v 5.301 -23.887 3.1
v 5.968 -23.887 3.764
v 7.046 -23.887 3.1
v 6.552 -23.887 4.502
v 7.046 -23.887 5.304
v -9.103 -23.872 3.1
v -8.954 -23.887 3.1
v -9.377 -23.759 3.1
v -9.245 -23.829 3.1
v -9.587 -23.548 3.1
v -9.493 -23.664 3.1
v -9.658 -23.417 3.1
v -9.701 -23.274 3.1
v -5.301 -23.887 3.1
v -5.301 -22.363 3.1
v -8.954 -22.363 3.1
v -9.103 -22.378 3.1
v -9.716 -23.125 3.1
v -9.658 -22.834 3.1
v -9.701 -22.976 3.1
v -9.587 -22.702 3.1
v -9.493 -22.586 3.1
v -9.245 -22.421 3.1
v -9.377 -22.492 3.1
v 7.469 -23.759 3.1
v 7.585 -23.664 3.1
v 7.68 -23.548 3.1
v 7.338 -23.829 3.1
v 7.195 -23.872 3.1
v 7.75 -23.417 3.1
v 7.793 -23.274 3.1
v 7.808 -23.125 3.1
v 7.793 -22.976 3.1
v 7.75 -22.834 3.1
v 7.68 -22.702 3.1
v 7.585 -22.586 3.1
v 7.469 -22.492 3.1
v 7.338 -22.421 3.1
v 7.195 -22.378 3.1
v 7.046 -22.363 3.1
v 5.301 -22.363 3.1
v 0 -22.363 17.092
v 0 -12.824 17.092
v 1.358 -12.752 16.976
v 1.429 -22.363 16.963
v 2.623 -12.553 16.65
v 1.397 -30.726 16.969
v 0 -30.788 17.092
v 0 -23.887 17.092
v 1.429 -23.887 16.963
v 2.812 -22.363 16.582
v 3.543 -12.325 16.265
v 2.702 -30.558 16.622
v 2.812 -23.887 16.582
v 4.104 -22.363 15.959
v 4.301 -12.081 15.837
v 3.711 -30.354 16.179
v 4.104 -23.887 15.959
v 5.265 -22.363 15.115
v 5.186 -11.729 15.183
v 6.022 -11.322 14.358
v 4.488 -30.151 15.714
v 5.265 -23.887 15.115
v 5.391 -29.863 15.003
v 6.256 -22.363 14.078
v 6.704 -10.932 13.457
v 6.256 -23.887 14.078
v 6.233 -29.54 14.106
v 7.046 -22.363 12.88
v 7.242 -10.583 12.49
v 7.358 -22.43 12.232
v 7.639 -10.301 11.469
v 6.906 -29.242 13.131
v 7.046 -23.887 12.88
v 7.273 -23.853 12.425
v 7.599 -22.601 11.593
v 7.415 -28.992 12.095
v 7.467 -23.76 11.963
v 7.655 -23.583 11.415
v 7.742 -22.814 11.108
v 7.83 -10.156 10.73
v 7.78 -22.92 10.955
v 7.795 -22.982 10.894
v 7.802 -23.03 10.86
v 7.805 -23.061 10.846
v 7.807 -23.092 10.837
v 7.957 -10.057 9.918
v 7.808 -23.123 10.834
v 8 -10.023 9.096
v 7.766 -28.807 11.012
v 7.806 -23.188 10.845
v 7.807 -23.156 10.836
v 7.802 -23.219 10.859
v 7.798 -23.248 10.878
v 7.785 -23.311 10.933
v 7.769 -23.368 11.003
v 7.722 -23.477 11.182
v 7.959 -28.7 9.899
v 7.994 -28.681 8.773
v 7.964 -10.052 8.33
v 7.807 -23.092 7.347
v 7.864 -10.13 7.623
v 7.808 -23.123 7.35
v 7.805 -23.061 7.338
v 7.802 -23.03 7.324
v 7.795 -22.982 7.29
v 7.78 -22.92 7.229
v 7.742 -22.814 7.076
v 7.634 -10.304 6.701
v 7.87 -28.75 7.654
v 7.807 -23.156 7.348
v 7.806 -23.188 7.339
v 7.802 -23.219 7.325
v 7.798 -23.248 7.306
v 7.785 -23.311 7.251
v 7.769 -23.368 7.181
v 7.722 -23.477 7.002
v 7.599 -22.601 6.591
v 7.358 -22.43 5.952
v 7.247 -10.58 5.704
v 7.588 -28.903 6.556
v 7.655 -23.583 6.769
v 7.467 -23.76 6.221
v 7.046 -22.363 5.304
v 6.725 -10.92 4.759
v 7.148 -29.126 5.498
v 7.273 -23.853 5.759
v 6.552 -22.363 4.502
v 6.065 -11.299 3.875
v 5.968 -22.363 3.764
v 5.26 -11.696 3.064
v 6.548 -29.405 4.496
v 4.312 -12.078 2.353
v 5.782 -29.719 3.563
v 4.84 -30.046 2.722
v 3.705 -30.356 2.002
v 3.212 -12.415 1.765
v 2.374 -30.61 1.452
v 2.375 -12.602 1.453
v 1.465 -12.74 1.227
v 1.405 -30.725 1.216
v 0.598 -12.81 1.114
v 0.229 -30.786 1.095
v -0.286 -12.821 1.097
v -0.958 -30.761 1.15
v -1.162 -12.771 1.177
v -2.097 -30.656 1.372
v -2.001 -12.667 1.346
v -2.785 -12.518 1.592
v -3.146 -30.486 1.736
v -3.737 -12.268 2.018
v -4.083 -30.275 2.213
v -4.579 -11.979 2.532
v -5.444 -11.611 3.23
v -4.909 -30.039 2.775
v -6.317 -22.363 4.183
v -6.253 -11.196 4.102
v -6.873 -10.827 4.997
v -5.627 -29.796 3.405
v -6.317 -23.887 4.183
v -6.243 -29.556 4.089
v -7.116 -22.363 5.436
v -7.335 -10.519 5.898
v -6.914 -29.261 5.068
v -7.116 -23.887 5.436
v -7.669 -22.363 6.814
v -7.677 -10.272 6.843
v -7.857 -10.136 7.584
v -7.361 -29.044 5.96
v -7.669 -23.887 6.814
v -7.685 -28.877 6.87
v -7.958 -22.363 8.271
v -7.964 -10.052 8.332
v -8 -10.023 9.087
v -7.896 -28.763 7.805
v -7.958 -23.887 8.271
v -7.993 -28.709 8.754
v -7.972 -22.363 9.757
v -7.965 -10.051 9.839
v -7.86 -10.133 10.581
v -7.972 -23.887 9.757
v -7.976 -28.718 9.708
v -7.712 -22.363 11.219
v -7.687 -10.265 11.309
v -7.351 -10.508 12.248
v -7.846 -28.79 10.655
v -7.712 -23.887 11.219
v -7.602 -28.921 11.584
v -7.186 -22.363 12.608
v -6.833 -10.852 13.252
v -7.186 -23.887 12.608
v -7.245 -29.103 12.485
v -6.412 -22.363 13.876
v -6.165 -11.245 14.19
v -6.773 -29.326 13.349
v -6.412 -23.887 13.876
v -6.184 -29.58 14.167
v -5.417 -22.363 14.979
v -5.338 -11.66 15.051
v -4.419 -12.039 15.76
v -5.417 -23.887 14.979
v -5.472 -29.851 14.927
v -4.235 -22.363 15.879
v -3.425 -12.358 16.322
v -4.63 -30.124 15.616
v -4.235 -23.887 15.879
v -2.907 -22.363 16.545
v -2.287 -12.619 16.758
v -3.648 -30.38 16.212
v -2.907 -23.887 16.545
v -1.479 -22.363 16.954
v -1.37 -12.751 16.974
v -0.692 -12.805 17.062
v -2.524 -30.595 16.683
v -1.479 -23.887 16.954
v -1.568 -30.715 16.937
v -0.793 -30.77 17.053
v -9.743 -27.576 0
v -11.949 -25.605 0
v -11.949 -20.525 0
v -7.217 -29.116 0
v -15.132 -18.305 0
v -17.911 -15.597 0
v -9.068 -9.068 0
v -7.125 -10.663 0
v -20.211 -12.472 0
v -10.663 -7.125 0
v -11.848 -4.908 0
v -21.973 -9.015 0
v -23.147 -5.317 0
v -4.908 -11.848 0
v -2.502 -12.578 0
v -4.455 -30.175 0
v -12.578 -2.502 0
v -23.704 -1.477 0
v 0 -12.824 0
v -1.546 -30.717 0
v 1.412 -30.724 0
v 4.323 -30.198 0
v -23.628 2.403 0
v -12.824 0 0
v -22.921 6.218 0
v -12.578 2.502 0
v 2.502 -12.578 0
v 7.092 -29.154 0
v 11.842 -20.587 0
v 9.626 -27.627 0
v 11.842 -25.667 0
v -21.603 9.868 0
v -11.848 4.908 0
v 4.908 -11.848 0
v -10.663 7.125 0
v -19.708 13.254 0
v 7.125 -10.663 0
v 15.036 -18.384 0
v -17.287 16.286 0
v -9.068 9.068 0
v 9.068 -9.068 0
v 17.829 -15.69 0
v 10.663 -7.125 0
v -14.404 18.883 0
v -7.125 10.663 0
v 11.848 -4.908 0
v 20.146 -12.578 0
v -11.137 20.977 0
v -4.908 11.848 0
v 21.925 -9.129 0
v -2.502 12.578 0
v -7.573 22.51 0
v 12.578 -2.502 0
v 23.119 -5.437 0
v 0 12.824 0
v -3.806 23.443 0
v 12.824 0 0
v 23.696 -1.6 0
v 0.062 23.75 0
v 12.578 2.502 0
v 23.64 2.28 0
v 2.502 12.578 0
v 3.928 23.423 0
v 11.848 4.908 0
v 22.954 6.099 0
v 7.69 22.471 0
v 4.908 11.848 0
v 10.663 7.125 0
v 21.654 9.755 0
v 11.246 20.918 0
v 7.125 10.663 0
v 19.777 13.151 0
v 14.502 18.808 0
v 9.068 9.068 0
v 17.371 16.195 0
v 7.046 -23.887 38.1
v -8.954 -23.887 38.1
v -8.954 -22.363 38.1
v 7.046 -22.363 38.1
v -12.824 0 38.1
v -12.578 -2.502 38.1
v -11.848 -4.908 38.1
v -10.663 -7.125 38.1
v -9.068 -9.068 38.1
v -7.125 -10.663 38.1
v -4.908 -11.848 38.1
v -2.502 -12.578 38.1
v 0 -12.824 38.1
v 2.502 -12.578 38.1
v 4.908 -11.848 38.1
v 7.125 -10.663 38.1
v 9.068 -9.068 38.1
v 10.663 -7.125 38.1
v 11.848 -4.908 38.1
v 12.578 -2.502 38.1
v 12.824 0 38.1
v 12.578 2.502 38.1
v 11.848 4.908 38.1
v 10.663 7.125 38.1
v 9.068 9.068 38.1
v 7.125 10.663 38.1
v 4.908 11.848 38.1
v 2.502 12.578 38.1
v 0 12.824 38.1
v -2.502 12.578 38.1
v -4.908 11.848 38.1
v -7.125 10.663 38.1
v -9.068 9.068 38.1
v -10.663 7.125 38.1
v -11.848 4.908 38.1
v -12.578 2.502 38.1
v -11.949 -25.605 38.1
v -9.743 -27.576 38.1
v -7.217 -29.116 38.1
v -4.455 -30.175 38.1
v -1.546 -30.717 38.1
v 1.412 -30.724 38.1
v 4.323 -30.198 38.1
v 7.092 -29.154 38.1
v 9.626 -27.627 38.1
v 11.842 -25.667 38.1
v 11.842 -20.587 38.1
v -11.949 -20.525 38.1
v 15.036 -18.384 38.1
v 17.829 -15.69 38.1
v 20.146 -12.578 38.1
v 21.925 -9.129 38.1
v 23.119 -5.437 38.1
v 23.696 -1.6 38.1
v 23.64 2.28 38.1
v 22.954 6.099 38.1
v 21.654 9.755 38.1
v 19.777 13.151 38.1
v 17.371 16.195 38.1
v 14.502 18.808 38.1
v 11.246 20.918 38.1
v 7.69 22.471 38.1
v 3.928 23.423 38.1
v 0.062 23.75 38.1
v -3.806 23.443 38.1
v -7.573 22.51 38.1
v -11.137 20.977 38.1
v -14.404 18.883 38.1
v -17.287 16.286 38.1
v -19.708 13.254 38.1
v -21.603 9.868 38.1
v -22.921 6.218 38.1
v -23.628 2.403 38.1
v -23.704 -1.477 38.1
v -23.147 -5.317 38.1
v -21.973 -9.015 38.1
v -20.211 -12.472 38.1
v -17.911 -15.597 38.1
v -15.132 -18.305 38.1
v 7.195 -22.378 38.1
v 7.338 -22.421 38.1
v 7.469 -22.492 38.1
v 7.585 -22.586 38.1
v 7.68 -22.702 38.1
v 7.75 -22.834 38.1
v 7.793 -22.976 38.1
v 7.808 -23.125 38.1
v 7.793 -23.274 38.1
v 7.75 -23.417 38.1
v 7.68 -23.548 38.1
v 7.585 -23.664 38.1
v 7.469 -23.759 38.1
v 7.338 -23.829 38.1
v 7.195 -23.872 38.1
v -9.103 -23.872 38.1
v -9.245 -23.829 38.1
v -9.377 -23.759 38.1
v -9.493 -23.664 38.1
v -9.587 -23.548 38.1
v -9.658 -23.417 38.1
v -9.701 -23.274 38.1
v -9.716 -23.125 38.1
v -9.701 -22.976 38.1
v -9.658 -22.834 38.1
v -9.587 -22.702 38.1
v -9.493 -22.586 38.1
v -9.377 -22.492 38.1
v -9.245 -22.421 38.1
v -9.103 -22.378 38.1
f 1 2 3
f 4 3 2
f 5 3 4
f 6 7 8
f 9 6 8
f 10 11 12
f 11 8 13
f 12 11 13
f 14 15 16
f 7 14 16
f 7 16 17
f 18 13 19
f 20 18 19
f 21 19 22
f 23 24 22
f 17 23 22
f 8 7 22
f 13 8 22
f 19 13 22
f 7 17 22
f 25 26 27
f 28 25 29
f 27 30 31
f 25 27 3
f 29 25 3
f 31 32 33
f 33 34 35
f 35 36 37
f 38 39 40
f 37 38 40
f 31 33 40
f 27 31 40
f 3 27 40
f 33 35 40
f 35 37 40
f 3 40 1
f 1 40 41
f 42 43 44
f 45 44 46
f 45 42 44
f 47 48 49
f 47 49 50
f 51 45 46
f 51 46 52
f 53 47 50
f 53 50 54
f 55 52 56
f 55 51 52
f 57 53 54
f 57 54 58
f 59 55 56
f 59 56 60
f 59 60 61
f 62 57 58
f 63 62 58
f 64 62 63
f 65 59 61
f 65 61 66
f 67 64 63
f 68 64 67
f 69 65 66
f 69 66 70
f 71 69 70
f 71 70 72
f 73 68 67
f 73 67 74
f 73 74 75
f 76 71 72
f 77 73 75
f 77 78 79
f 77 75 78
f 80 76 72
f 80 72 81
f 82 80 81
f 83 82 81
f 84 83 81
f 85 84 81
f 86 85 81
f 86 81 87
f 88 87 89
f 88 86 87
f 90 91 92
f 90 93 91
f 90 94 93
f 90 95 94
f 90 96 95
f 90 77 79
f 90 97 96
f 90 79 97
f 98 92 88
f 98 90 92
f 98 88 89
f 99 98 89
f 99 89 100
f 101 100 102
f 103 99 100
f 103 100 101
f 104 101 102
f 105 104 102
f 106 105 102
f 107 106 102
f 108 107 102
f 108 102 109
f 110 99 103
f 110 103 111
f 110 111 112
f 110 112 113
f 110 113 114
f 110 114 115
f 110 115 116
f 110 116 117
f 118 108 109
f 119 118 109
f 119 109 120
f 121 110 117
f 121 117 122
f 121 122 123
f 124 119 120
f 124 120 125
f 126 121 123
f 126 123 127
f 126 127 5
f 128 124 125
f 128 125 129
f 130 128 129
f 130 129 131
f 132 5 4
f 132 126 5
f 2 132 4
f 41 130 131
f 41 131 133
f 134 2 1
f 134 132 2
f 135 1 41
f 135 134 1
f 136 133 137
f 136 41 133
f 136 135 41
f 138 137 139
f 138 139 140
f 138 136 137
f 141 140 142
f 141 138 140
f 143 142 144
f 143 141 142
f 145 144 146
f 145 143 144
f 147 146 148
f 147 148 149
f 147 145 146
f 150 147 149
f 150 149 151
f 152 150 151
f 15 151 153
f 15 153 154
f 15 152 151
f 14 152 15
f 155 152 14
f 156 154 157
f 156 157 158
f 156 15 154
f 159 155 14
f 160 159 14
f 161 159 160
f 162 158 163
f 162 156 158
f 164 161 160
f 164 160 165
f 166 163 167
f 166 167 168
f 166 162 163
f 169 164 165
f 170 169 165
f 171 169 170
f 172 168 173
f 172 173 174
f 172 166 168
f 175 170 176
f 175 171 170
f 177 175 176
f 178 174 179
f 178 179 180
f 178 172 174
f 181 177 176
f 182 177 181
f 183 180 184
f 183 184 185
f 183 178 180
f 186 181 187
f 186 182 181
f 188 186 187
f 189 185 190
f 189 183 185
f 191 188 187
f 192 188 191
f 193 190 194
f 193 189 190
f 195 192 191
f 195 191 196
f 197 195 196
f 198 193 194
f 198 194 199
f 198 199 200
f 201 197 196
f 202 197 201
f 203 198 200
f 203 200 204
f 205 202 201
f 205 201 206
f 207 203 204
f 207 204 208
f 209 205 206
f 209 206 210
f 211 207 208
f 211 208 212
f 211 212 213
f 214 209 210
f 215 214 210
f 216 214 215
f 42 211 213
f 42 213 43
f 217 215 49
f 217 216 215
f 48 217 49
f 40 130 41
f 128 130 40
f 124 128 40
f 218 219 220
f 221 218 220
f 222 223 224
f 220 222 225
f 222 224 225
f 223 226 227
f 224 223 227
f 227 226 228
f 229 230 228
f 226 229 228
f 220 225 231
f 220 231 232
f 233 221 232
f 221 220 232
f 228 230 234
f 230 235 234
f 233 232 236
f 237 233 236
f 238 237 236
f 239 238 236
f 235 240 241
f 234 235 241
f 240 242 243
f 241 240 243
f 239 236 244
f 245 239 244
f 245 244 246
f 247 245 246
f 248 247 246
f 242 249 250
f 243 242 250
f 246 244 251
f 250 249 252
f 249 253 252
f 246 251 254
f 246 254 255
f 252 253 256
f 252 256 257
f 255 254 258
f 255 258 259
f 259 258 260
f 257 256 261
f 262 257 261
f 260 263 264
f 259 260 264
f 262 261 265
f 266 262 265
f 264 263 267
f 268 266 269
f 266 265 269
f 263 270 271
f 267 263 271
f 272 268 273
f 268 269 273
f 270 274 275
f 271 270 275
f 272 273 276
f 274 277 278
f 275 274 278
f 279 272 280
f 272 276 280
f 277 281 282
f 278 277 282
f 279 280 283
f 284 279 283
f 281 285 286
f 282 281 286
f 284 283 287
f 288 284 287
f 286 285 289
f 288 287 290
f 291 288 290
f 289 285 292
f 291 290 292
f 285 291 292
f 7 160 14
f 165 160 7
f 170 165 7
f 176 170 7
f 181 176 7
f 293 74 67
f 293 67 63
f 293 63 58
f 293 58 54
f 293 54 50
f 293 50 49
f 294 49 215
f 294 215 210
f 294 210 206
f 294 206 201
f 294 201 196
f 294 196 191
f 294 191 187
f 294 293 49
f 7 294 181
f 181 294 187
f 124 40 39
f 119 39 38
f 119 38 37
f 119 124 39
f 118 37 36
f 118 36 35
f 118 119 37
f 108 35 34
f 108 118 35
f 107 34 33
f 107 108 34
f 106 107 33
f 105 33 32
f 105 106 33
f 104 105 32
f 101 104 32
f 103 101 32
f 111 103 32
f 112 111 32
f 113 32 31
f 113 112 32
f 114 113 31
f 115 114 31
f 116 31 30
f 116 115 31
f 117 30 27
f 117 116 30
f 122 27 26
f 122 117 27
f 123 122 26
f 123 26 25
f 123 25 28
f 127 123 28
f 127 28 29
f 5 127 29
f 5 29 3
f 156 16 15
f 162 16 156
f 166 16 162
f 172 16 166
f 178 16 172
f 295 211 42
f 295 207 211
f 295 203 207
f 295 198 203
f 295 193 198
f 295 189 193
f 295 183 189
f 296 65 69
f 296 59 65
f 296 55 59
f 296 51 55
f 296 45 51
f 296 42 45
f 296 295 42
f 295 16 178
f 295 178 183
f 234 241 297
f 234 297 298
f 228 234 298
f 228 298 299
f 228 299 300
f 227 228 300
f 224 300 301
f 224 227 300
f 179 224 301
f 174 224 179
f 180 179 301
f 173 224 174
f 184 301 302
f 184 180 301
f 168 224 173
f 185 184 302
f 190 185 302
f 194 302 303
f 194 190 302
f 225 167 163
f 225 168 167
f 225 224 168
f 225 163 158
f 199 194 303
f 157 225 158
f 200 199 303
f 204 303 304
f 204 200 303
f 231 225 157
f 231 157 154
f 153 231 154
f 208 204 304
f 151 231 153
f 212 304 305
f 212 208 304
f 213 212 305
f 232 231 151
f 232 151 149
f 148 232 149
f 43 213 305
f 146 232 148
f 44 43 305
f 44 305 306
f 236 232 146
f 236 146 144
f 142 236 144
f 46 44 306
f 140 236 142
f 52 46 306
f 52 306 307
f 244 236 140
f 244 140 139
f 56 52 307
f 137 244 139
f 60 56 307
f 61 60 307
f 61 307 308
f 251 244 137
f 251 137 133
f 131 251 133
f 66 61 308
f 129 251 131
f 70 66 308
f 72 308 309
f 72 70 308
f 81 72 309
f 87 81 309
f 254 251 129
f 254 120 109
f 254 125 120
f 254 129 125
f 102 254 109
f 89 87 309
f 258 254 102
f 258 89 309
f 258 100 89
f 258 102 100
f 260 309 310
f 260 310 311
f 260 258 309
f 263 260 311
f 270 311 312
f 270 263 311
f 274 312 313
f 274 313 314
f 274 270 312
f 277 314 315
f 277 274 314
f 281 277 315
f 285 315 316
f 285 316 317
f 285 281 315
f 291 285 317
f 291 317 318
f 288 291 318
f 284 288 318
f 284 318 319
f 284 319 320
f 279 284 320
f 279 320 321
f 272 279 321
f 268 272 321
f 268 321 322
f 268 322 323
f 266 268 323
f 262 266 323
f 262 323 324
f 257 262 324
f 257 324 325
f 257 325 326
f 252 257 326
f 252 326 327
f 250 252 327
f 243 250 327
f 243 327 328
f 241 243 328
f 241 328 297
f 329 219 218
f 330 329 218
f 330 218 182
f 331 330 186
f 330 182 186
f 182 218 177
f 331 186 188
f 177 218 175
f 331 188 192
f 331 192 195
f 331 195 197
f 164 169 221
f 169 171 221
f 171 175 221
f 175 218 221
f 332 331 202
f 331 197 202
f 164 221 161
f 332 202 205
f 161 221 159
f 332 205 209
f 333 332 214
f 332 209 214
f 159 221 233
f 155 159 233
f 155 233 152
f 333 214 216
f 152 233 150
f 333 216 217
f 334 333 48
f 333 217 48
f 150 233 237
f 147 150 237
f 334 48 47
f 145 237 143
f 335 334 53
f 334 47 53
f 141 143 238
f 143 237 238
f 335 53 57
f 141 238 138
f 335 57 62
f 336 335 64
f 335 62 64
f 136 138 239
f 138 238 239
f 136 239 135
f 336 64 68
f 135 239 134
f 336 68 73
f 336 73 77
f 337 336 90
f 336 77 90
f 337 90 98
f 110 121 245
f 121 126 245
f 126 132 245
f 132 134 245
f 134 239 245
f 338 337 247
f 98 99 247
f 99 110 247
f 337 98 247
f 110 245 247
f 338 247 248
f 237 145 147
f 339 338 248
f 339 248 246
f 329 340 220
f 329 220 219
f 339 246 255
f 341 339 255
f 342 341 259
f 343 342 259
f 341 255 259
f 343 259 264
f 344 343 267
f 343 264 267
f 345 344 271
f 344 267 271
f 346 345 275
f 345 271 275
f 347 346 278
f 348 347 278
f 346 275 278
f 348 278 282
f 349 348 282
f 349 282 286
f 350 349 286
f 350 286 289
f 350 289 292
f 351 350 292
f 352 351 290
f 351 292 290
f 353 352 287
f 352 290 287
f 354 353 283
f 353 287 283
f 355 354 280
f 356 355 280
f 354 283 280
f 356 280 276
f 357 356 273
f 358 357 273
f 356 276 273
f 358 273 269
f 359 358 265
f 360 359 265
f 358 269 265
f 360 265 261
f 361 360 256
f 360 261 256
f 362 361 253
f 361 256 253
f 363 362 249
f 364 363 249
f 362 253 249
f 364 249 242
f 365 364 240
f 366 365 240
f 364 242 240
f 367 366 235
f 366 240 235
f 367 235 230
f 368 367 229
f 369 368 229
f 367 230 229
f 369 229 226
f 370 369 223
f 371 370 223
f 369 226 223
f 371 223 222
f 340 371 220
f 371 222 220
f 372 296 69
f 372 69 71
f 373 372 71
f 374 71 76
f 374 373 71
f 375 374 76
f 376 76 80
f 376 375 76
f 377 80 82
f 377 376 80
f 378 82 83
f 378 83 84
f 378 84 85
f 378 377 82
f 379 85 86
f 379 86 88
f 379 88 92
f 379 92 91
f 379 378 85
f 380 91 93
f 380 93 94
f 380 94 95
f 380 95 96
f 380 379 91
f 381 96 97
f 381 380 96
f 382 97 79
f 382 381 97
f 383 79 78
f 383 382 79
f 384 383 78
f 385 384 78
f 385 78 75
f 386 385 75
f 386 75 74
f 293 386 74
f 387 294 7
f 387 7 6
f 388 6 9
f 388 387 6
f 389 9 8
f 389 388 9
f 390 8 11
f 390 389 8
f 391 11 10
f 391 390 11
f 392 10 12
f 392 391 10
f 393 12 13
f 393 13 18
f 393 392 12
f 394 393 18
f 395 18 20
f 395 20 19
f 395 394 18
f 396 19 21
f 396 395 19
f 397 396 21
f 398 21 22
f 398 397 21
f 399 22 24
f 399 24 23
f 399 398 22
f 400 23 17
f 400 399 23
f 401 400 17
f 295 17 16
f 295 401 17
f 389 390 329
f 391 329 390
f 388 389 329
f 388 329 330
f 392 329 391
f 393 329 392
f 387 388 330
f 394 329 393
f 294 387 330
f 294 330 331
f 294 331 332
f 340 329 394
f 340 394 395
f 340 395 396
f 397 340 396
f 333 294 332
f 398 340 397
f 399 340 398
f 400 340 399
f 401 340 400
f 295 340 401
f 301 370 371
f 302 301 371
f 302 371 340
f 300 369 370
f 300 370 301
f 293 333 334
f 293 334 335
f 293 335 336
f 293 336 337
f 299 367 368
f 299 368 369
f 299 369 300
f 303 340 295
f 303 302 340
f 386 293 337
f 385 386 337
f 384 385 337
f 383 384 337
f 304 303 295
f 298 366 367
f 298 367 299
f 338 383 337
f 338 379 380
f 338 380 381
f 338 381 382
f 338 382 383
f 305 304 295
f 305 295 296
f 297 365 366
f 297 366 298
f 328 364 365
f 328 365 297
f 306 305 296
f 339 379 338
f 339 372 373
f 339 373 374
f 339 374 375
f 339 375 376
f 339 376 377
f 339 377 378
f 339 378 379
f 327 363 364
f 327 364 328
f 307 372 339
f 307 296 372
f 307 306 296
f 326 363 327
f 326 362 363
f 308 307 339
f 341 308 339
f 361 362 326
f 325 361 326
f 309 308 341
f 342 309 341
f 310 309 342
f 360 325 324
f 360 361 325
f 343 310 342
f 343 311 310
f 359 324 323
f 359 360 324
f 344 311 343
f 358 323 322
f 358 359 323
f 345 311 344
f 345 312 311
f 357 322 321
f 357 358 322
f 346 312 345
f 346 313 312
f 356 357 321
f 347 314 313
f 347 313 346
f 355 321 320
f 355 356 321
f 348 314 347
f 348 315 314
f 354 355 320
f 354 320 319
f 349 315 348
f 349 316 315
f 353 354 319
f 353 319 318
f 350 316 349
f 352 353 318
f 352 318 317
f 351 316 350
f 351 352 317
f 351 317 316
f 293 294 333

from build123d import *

# Parameters (mm, degrees)
SKETCH1_R               = 12.824135806
BOSS_EXTRUDE2_DEPTH     = 38.1
CUT_EXTRUDE1_DEPTH      = 35
CUT_EXTRUDE2_DEPTH      = 23.57
CUT_EXTRUDE2_DEPTH_BACK = 23.57
SKETCH6_R               = 8


with BuildPart() as part:
    # Sketch1 → Boss-Extrude2 (new body)
    with BuildSketch(Plane.XY):
        with BuildLine():
            Line((11.842048876, -25.66709252), (11.842048876, -20.58709252))
            ThreePointArc((11.842048876, -20.58709252), (0.061981133, 23.749919123), (-11.94934079, -20.525003159))
            Line((-11.94934079, -20.525003159), (-11.94934079, -25.605003159))
            ThreePointArc((-11.94934079, -25.605003159), (-0.067090695, -30.787800341), (11.842048876, -25.66709252))
        make_face()
        Circle(SKETCH1_R, mode=Mode.SUBTRACT)
    extrude(amount=BOSS_EXTRUDE2_DEPTH)

    # Sketch3 → Cut-Extrude1 (cut)
    with BuildSketch(Plane.XY.offset(38.1)):
        with BuildLine():
            Line((-8.95388159, -22.363138181), (7.04611841, -22.363138181))
            ThreePointArc((7.04611841, -22.363138181), (7.80811841, -23.125138181), (7.04611841, -23.887138181))
            Line((7.04611841, -23.887138181), (-8.95388159, -23.887138181))
            ThreePointArc((-8.95388159, -23.887138181), (-9.71588159, -23.125138181), (-8.95388159, -22.363138181))
        make_face()
    extrude(amount=-CUT_EXTRUDE1_DEPTH, mode=Mode.SUBTRACT)

    # Sketch6 → Cut-Extrude2 (cut, two sides: drawn at the far end of the back side and taken through both)
    with BuildSketch(Plane(origin=(0, -23.887138181, 0), x_dir=(1, 0, 0), z_dir=(0, 1, 0)).offset(-CUT_EXTRUDE2_DEPTH_BACK)):
        with Locations((0, -9.09196145)):
            Circle(SKETCH6_R)
    extrude(amount=CUT_EXTRUDE2_DEPTH + CUT_EXTRUDE2_DEPTH_BACK, mode=Mode.SUBTRACT)


solid = part.part
